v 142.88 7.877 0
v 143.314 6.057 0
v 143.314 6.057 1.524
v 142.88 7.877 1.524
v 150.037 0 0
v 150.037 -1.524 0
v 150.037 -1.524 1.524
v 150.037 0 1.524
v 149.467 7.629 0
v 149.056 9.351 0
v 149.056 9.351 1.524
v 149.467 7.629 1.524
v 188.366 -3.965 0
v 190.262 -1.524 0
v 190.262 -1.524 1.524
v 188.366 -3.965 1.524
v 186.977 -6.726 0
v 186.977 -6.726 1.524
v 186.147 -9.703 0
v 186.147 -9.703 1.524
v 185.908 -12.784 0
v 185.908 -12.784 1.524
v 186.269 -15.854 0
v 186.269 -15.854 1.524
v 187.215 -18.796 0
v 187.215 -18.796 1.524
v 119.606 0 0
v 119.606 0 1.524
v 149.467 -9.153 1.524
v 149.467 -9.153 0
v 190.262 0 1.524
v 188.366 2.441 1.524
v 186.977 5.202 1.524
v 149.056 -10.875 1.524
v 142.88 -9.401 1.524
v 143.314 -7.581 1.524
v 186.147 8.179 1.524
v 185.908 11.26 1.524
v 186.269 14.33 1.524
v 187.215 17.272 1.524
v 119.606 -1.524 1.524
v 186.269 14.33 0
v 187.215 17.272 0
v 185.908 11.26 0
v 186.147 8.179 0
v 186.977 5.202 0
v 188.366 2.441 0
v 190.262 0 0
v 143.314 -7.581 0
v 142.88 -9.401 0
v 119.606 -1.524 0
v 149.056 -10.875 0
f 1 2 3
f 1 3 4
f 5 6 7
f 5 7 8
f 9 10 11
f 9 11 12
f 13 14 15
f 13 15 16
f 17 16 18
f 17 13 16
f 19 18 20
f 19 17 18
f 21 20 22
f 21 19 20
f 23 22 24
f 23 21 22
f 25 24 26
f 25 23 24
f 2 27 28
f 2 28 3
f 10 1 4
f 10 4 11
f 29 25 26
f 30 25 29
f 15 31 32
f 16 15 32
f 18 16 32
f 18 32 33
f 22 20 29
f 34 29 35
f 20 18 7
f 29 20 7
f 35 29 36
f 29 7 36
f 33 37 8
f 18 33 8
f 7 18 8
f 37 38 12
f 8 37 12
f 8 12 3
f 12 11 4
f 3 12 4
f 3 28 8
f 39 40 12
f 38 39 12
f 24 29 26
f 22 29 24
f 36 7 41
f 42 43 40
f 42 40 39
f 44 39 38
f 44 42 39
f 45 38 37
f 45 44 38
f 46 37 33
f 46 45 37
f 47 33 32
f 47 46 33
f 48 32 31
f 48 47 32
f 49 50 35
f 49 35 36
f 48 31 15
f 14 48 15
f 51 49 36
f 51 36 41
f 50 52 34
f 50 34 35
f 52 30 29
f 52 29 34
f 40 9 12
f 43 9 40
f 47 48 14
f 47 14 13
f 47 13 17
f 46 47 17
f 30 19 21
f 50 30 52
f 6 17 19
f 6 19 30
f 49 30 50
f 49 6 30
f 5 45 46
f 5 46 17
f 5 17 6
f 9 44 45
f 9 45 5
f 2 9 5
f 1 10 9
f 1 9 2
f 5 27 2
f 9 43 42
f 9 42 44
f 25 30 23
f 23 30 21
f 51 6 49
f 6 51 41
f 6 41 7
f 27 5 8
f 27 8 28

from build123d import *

# Parameters (mm, degrees)
BOSS_EXTRUDE1_DEPTH = 1.524


with BuildPart() as part:
    # Sketch1 → Boss-Extrude1 (new body)
    with BuildSketch(Plane.XY):
        with BuildLine():
            Line((150.036715568, -1.524), (150.036715568, 0))
            Line((150.036715568, 0), (119.605645903, 0))
            Line((119.605645903, 0), (143.313878366, 6.056634362))
            Line((143.313878366, 6.056634362), (142.879507781, 7.877232472))
            Line((142.879507781, 7.877232472), (149.056142524, 9.350895679))
            Line((149.056142524, 9.350895679), (149.467068546, 7.628561883))
            Line((149.467068546, 7.628561883), (187.215425718, 17.271963073))
            ThreePointArc((187.215425718, 17.271963073), (186.146982613, 8.178774912), (190.262232611, 0))
            Line((190.262232611, 0), (190.262232611, -1.524))
            ThreePointArc((190.262232611, -1.524), (186.146982613, -9.702774912), (187.215425718, -18.795963073))
            Line((187.215425718, -18.795963073), (149.467068546, -9.152561883))
            Line((149.467068546, -9.152561883), (149.056142524, -10.874895679))
            Line((149.056142524, -10.874895679), (142.879507781, -9.401232472))
            Line((142.879507781, -9.401232472), (143.313878366, -7.580634362))
            Line((143.313878366, -7.580634362), (119.605645903, -1.524))
            Line((119.605645903, -1.524), (150.036715568, -1.524))
        make_face()
    extrude(amount=BOSS_EXTRUDE1_DEPTH)


solid = part.part
